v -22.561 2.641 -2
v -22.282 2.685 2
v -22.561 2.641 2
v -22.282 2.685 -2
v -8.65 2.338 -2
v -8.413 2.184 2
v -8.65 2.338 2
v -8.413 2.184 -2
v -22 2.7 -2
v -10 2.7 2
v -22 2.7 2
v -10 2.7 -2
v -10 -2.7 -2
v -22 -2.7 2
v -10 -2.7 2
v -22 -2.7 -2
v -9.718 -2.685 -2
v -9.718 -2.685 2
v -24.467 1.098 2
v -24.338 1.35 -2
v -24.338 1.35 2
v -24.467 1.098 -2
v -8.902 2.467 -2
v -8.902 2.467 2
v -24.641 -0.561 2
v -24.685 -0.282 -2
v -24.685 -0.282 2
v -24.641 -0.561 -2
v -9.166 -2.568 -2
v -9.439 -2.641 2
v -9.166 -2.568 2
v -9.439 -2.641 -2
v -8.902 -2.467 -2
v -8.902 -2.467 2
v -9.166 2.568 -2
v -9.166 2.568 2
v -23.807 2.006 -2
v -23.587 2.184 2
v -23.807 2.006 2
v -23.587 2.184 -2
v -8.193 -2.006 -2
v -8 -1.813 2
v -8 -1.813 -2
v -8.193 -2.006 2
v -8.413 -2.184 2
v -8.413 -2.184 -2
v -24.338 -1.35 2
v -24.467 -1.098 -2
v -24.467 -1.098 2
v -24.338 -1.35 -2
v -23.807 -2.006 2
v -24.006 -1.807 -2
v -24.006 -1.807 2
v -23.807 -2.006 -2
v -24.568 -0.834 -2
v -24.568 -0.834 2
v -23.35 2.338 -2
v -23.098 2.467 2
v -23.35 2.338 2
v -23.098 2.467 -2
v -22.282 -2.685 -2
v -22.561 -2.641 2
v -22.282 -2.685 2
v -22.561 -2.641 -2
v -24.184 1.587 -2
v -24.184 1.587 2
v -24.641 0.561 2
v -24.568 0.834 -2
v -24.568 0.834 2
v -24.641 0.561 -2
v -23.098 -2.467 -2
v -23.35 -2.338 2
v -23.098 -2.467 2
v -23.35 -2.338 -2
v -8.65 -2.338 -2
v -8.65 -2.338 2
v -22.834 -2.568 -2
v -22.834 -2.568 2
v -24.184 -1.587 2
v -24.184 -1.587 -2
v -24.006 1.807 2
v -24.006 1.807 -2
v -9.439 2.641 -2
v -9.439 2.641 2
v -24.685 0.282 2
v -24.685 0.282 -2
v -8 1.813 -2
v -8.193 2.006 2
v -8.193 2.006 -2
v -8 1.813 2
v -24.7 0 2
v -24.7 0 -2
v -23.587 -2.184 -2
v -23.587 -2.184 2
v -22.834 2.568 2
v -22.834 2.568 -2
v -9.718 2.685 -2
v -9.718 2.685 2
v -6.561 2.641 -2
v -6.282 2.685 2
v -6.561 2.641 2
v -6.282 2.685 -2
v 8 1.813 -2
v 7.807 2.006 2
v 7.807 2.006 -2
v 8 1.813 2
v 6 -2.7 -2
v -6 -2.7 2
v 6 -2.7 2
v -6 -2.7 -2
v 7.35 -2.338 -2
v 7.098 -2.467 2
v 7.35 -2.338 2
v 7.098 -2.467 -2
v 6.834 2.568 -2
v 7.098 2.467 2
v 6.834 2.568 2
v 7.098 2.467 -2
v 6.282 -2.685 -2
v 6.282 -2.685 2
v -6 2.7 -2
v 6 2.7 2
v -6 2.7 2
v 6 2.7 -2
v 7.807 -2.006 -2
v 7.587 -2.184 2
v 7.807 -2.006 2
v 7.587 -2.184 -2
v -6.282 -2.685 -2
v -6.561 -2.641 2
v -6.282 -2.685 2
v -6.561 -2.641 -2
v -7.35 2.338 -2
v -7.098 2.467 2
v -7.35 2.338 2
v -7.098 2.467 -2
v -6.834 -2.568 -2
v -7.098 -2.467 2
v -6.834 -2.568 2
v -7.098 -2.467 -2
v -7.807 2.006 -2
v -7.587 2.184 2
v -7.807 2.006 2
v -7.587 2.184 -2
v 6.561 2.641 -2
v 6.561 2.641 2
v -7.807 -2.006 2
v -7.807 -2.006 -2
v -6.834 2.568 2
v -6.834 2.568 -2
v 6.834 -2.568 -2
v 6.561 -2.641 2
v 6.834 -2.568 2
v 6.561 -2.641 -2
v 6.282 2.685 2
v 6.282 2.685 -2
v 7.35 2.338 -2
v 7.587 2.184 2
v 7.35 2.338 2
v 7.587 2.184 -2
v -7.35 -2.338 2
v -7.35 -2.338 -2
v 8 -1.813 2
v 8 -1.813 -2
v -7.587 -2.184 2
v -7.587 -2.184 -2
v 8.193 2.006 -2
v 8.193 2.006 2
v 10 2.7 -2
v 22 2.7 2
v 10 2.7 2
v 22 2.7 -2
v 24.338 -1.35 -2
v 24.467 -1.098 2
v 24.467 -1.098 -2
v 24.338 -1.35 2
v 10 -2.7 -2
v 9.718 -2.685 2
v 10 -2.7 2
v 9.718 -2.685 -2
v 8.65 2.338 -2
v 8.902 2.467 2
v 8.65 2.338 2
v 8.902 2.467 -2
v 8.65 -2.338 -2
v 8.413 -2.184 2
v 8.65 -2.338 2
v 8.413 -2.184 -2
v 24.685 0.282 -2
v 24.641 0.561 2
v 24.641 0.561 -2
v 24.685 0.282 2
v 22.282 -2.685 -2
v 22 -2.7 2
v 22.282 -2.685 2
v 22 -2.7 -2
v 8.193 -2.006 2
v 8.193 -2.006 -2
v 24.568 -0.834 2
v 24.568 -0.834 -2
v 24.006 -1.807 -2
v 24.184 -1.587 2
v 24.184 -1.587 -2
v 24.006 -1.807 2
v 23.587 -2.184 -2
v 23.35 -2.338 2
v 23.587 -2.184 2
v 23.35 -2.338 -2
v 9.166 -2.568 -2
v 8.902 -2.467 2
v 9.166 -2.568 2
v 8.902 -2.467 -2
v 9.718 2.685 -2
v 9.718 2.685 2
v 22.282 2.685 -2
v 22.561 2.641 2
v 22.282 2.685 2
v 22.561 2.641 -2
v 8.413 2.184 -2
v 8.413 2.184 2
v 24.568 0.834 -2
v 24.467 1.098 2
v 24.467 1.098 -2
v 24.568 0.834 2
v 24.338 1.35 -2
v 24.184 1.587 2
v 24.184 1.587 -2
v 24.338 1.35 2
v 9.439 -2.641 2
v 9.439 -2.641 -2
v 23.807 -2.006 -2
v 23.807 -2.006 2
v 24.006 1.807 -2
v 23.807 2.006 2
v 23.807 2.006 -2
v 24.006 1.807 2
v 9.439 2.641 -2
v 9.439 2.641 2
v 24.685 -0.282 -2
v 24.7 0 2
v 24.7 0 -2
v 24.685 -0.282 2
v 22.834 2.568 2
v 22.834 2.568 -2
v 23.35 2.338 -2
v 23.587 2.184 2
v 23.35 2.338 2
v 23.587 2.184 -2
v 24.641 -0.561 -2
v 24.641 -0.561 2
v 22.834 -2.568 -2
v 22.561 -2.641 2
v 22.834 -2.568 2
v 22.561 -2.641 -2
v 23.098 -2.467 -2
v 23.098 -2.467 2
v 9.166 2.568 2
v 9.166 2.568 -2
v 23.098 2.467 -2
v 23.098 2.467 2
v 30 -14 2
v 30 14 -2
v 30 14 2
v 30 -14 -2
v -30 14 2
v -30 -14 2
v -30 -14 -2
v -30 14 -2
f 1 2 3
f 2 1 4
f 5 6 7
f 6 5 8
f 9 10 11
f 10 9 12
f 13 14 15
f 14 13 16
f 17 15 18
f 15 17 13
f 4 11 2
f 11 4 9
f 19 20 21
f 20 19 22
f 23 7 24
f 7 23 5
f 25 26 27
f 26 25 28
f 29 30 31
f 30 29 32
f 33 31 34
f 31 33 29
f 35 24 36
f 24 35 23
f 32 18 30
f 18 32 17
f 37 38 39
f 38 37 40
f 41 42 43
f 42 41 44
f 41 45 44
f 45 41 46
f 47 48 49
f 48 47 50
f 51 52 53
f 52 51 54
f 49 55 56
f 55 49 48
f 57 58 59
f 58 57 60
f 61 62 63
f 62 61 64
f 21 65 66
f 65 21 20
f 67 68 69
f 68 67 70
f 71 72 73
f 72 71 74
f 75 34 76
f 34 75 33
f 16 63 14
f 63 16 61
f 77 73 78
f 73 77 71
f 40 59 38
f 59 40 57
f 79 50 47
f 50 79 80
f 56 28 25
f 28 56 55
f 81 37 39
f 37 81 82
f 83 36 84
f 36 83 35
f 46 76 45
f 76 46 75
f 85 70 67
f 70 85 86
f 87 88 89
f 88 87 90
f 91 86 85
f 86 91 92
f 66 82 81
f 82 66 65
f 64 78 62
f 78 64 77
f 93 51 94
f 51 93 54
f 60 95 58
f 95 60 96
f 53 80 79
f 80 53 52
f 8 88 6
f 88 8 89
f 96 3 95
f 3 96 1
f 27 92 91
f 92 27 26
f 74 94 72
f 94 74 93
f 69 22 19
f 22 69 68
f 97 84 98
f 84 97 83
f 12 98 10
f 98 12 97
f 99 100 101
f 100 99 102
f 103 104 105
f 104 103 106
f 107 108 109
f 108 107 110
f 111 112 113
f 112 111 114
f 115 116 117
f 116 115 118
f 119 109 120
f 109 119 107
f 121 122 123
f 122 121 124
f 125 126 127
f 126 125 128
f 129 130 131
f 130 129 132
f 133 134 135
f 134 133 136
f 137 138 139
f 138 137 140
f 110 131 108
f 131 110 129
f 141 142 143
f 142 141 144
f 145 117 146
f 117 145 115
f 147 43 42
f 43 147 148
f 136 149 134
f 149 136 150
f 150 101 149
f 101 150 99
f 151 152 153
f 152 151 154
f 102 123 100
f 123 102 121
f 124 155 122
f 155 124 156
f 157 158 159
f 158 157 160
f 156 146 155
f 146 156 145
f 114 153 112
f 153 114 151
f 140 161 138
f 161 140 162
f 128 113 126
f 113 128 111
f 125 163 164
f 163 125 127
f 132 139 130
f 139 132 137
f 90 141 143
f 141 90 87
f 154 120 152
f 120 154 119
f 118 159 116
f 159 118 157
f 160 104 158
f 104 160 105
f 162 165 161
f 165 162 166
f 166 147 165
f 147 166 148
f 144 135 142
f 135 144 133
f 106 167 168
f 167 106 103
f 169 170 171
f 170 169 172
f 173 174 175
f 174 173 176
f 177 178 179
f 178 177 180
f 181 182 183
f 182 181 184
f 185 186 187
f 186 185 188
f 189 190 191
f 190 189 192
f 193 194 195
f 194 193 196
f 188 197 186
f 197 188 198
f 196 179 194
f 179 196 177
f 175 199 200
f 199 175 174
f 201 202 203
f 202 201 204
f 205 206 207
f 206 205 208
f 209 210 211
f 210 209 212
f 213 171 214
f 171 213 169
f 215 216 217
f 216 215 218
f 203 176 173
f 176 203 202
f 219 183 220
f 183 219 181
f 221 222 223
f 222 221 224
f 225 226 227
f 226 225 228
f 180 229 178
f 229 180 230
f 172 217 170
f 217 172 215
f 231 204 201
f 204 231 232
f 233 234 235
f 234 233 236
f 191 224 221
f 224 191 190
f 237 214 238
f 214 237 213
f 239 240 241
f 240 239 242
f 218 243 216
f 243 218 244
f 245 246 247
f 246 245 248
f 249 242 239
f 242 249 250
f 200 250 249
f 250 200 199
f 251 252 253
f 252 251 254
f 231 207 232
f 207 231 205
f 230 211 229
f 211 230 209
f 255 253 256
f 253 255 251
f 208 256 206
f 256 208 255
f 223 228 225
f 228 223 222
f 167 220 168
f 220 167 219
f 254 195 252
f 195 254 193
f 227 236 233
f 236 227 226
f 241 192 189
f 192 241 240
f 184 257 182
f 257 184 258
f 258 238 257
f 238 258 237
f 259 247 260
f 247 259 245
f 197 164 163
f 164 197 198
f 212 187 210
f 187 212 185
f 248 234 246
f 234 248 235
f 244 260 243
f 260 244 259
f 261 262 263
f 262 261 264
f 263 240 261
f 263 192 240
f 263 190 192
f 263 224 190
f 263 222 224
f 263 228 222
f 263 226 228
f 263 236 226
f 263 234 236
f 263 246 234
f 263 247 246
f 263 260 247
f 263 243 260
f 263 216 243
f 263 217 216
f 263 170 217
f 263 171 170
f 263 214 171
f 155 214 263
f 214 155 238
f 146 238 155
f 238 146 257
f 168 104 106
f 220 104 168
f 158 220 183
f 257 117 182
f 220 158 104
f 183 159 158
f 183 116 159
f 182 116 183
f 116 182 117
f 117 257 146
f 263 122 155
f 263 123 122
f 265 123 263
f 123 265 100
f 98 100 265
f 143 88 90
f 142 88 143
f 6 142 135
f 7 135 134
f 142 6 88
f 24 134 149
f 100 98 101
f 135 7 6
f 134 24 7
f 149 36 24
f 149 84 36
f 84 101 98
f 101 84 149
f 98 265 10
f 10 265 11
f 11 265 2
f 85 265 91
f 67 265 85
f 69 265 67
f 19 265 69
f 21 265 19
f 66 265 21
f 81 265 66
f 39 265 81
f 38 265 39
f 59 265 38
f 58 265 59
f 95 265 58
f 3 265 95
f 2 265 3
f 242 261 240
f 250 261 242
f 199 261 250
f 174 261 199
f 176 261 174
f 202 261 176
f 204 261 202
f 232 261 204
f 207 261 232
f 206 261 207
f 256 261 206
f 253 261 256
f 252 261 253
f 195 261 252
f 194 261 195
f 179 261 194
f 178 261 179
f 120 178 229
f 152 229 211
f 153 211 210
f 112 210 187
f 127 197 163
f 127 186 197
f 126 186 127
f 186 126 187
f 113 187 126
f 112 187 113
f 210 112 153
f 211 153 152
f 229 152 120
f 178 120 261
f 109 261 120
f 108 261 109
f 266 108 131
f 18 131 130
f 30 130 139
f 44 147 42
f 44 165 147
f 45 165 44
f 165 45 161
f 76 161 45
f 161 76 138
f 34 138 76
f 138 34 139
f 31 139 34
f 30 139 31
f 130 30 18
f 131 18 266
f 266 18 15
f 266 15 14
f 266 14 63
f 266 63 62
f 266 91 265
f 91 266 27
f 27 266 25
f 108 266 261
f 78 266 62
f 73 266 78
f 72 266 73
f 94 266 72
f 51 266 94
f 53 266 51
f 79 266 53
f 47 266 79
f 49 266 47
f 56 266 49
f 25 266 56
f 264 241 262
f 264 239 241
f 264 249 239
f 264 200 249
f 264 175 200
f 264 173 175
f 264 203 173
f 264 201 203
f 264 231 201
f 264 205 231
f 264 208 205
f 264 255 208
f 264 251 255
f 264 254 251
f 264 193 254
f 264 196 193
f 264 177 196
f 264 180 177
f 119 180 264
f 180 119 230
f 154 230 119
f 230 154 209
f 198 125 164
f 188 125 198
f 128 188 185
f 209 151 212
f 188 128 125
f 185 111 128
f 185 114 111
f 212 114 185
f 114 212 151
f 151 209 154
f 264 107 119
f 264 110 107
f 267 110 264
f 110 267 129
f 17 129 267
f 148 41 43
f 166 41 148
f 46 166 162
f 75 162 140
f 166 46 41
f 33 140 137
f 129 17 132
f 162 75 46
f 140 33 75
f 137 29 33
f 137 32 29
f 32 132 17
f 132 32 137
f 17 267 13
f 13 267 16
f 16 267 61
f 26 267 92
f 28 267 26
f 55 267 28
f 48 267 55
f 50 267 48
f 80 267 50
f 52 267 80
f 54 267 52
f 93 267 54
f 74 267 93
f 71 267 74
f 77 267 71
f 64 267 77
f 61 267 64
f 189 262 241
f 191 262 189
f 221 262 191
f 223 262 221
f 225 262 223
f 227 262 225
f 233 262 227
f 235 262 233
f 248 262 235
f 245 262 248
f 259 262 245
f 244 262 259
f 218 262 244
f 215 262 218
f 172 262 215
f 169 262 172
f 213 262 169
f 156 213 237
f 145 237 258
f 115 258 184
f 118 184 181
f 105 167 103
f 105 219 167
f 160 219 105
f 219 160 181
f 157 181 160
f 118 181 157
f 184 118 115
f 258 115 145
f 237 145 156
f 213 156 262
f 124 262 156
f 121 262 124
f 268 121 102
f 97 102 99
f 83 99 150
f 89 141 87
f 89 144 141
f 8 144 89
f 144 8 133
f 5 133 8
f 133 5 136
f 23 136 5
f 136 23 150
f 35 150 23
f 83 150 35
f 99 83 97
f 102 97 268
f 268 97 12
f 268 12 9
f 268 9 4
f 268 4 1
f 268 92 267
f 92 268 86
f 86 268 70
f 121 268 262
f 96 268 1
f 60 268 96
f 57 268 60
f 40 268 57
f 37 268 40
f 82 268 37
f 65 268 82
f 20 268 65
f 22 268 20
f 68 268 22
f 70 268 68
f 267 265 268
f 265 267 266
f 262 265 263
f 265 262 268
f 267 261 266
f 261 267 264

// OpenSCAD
// Slotted mounting plate.
$fn = 60;
eps = 0.02;
plate_l = 60;
plate_w = 28;
plate_t = 4;
slot_l = 12;
slot_d = 5.4;
module slot(x) { hull() { translate([x-slot_l/2,0,-plate_t/2-eps]) cylinder(d=slot_d,h=plate_t+2*eps); translate([x+slot_l/2,0,-plate_t/2-eps]) cylinder(d=slot_d,h=plate_t+2*eps); } }
difference() { cube([plate_l, plate_w, plate_t], center=true); for (i=[0:2]) slot(-plate_l/2+14+i*(plate_l-28)/max(1,2)); }
